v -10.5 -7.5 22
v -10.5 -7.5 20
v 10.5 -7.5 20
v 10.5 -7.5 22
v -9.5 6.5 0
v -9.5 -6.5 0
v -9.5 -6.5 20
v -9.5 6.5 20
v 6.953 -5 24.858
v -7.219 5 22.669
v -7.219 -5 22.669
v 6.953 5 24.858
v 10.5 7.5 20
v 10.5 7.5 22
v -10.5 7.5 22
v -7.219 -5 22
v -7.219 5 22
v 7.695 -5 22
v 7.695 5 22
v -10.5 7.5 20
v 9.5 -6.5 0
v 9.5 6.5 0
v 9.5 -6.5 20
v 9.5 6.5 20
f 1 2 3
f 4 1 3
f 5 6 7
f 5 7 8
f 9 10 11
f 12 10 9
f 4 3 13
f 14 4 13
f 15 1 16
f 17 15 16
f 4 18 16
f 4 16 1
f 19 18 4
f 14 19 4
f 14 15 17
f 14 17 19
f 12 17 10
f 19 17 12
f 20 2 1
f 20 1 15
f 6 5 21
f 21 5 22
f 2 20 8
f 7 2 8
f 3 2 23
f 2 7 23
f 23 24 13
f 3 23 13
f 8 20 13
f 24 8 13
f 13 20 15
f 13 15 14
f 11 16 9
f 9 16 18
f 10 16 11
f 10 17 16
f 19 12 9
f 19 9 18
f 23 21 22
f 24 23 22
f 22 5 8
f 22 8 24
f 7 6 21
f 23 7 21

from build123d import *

# Parameters (mm, degrees)
SKETCH1_W                = 19
SKETCH1_H                = 13
BOSS_EXTRUDE1_DEPTH      = 20
SKETCH2_W                = 21
SKETCH2_H                = 15
BOSS_EXTRUDE2_DEPTH      = 2
BOSS_EXTRUDE3_DEPTH      = 5
BOSS_EXTRUDE3_DEPTH_BACK = 5


with BuildPart() as part:
    # Sketch1 → Boss-Extrude1 (new body)
    with BuildSketch(Plane.XY):
        Rectangle(SKETCH1_W, SKETCH1_H)
    extrude(amount=BOSS_EXTRUDE1_DEPTH)

    # Sketch2 → Boss-Extrude2 (add)
    with BuildSketch(Plane.XY.offset(20)):
        Rectangle(SKETCH2_W, SKETCH2_H)
    extrude(amount=BOSS_EXTRUDE2_DEPTH)

    # Sketch3 → Boss-Extrude3 (add, two sides)
    with BuildSketch(Plane(origin=(0, 0, 0), x_dir=(1, 0, 0), z_dir=(0, 1, 0))) as boss_extrude3_sk:
        Polygon((-7.218671047, -22), (-7.218671047, -22.66914067), (6.952686856, -24.857910608), (7.694642767, -22), align=None)
    extrude(amount=BOSS_EXTRUDE3_DEPTH)
    extrude(boss_extrude3_sk.sketch, amount=-BOSS_EXTRUDE3_DEPTH_BACK)


solid = part.part
